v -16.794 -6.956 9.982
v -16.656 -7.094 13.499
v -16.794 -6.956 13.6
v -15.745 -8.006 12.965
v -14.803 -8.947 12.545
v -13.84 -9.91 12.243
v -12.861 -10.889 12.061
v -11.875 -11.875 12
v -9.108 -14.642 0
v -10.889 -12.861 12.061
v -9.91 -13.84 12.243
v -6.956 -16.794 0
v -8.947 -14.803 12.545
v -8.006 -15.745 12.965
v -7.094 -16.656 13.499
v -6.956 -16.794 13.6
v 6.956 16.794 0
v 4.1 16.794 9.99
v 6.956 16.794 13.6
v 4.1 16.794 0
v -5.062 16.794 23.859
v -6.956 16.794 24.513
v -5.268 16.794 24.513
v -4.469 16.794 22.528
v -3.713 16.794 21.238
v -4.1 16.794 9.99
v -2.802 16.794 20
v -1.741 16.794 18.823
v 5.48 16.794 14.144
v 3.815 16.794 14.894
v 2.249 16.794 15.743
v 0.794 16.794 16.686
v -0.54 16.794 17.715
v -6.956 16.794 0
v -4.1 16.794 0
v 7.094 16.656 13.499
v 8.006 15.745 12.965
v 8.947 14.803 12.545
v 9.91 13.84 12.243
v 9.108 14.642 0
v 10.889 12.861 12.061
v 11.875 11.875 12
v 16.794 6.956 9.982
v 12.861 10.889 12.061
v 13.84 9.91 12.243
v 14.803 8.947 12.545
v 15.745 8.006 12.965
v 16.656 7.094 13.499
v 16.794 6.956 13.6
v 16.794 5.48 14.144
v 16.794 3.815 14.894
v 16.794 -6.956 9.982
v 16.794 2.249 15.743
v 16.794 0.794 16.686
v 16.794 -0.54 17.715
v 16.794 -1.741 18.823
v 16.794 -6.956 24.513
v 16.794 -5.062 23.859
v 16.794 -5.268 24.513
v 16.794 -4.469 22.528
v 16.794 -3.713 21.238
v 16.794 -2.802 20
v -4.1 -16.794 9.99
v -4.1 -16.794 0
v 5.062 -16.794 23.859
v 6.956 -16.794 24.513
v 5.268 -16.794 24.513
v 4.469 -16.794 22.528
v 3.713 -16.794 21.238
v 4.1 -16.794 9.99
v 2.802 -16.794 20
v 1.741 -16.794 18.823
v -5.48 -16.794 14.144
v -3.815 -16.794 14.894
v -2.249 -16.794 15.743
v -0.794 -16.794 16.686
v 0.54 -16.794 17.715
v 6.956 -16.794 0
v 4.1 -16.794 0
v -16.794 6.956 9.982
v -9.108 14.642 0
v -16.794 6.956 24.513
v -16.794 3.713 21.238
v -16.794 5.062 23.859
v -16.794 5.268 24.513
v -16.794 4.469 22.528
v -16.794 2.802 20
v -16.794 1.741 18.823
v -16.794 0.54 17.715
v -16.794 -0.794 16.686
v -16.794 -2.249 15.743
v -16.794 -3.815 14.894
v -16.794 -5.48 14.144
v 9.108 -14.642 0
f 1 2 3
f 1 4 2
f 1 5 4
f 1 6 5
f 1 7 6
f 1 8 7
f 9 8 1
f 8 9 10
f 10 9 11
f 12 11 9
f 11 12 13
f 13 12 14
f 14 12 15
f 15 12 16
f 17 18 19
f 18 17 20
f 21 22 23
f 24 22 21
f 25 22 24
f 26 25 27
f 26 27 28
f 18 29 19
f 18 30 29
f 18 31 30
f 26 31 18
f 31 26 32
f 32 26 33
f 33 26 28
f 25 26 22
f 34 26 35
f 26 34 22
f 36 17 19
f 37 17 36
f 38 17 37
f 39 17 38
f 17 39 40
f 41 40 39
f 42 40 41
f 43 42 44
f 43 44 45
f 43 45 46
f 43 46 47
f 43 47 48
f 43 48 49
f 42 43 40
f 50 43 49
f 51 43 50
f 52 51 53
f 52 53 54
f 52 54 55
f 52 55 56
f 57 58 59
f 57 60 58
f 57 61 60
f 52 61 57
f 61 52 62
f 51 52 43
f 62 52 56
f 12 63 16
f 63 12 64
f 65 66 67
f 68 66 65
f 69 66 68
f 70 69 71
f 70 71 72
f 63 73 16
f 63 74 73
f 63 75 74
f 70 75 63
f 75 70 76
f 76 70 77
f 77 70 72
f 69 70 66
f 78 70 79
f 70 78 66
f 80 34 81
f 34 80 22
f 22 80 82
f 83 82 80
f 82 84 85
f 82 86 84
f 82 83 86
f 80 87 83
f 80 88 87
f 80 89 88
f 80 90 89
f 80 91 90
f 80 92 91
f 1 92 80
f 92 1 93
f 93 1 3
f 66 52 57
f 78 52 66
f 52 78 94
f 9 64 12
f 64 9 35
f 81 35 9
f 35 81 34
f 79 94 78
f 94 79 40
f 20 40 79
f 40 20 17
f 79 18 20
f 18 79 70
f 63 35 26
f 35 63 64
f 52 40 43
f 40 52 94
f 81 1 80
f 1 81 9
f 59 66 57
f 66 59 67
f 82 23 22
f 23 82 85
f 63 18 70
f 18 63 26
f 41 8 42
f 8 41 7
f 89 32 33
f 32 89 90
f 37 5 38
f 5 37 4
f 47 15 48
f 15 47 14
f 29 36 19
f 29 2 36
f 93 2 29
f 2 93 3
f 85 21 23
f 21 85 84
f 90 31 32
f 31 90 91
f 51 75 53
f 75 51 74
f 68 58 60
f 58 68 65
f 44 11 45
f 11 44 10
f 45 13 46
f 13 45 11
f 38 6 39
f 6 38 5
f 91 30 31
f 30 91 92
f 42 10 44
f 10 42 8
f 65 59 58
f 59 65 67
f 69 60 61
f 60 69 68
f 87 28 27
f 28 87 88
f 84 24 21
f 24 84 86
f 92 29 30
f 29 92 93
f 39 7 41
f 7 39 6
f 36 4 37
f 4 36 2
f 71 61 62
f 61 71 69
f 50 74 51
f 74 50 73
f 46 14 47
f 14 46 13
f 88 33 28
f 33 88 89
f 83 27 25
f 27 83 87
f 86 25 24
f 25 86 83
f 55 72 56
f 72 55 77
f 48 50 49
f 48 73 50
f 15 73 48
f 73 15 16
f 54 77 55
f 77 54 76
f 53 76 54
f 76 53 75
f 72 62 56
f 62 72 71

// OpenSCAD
// -*- mode: SCAD ; c-file-style: "ellemtel" ; coding: utf-8 -*-
//
// Inner tube foot for acrylic i3-style printers with 8 mm plates.
// For example GeeTech i3s.
//
// (c) 2018 Roland Sieker <ospalh@gmail.com>
// Licence: CC-BY-SA 4.0


// A single plate. Millimetres
plate_width = 8.0;  // [2:0.1:15]

// Inflate it accordingly... Millimetres
inner_tube_diameter = 32;  // [20:1:50]

// ... to preview. You will get all parts when you click "Create Thing".
part = "single width ⟍ foot"; // [single width ⟍ foot: single width ⟍ foot, double width ⟍ foot: double width ⟍ foot, single width ⟋ foot: single width ⟋ foot, double width ⟋ foot: double width ⟋ foot]

// Cylinder section style. *Flat* is slightly smaller, *half* is exactly a half cylinder, *high* grabs the tube a bit
style = -0.5;  // [-0.5: flat, 0: half, 0.5: high]

// Set this to "render" and click on "Create Thing" when done with the setup.
preview = 1; // [0:render, 1:preview]



/* [Hidden] */

// Done with the customizer

w = 1.6;  // Wall width of the tube part
tw = 5; // Width at the top. This is the
p = 2.0;  // height of the connecting plate
min_ph = 10;  // Height of the plate connector
cs = 0.2; // clearance

// *******************************************************
// Some shortcuts. These shouldn't be changed

tau = 2 * PI;  // pi is still wrong. tau = circumference / r
angle = 45; // The overhangs are not expected to look good here.
z_factor = tan(angle);


some_distance = 1.2*inner_tube_diameter;
ms = 0.01;  // Muggeseggele.


// fn for differently sized objects and fs, fa; all for preview or rendering.
pna = 40;
pnb = 15;
pa = 5;
ps = 1;
rna = 180;
rnb = 30;
ra = 1;
rs = 0.1;
function na() = (preview) ? pna : rna;
function nb() = (preview) ? pnb : rnb;
$fs = (preview) ? ps : rs;
$fa = (preview) ? pa : ra;

// *******************************************************
// End setup



// *******************************************************
// Generate the parts

print_part();
// preview_parts();


module print_part()
{
   if ("single width ⟍ foot" == part)
   {
      foot(plate_width);
   }
   if ("double width ⟍ foot" == part)
   {
      foot(2*plate_width);
   }
   if ("single width ⟋ foot" == part)
   {
      mirror()
      {
         foot(plate_width);
      }
   }
   if ("double width ⟋ foot" == part)
   {
      mirror()
      {
         foot(2*plate_width);
      }
   }

}

module preview_parts()
{
   foot(plate_width);
   translate([some_distance, 0, 0])
   {
      foot(2*plate_width);
   }
   translate([0, some_distance, 0])
   {
      mirror()
      {
         foot(plate_width);
      }
   }
   translate([some_distance, some_distance, 0])
   {
      mirror()
      {
         foot(2*plate_width);
      }
   }
}



// *******************************************************
// Code for the parts themselves


module foot(pw)
{
   itr = inner_tube_diameter/2;
   function orm() = (style >= 0) ? w : -style*w;
   ir = itr + orm();
   or = ir*1.082;

   xo = (pw+cs)/2  + tw;  // X offset. Where the cut begins.
   po = ir - xo ; // The rest. The width of the top cut

   ph = max(po*z_factor, min_ph);
   st_l = sqrt(ph*ph+po*po);
   st_a = acos((ph)/st_l);

   itt_r = itr - w;
   // how wide the inner tube thing should be in the end. The circle has
   // the radius of the inner tube, but the height is so that we get w on
   // either side.
   itt_e = sqrt(itr*itr - itt_r*itt_r);

   // The top part
   difference()
   {
      rotate(22.5)
      {
         cylinder(r=or, h=ph, $fn=8);
      }
      translate([0,0,ph/2-ms])
      {
         cube([pw+cs, 2*or+2*ms, ph+2*ms], center=true);
      }
      side_cut();
      mirror()
      {
         side_cut();
      }
   }

   difference()
   {
      translate([0, 0, ph-ms])
      {
         rotate(22.5)
         {
            cylinder(r=or, h=itr+p+style*itt_e+ms, $fn=8);
         }
      }
      translate([0, 0, ph+p+itr])
      {
         rotate(45)
         {
            rotate([0,90,0])
            {
               cylinder(r=itr,h=2*or+2*ms,center=true);
            }
         }
      }
   }

   module side_cut()
   {
      translate([xo, -or-ms, -ms])
      {
         rotate([0, st_a, 0])
         {
            {
               cube([or, 2*or+2*ms, st_l+2*ms]);
            }
         }
      }
   }

}
